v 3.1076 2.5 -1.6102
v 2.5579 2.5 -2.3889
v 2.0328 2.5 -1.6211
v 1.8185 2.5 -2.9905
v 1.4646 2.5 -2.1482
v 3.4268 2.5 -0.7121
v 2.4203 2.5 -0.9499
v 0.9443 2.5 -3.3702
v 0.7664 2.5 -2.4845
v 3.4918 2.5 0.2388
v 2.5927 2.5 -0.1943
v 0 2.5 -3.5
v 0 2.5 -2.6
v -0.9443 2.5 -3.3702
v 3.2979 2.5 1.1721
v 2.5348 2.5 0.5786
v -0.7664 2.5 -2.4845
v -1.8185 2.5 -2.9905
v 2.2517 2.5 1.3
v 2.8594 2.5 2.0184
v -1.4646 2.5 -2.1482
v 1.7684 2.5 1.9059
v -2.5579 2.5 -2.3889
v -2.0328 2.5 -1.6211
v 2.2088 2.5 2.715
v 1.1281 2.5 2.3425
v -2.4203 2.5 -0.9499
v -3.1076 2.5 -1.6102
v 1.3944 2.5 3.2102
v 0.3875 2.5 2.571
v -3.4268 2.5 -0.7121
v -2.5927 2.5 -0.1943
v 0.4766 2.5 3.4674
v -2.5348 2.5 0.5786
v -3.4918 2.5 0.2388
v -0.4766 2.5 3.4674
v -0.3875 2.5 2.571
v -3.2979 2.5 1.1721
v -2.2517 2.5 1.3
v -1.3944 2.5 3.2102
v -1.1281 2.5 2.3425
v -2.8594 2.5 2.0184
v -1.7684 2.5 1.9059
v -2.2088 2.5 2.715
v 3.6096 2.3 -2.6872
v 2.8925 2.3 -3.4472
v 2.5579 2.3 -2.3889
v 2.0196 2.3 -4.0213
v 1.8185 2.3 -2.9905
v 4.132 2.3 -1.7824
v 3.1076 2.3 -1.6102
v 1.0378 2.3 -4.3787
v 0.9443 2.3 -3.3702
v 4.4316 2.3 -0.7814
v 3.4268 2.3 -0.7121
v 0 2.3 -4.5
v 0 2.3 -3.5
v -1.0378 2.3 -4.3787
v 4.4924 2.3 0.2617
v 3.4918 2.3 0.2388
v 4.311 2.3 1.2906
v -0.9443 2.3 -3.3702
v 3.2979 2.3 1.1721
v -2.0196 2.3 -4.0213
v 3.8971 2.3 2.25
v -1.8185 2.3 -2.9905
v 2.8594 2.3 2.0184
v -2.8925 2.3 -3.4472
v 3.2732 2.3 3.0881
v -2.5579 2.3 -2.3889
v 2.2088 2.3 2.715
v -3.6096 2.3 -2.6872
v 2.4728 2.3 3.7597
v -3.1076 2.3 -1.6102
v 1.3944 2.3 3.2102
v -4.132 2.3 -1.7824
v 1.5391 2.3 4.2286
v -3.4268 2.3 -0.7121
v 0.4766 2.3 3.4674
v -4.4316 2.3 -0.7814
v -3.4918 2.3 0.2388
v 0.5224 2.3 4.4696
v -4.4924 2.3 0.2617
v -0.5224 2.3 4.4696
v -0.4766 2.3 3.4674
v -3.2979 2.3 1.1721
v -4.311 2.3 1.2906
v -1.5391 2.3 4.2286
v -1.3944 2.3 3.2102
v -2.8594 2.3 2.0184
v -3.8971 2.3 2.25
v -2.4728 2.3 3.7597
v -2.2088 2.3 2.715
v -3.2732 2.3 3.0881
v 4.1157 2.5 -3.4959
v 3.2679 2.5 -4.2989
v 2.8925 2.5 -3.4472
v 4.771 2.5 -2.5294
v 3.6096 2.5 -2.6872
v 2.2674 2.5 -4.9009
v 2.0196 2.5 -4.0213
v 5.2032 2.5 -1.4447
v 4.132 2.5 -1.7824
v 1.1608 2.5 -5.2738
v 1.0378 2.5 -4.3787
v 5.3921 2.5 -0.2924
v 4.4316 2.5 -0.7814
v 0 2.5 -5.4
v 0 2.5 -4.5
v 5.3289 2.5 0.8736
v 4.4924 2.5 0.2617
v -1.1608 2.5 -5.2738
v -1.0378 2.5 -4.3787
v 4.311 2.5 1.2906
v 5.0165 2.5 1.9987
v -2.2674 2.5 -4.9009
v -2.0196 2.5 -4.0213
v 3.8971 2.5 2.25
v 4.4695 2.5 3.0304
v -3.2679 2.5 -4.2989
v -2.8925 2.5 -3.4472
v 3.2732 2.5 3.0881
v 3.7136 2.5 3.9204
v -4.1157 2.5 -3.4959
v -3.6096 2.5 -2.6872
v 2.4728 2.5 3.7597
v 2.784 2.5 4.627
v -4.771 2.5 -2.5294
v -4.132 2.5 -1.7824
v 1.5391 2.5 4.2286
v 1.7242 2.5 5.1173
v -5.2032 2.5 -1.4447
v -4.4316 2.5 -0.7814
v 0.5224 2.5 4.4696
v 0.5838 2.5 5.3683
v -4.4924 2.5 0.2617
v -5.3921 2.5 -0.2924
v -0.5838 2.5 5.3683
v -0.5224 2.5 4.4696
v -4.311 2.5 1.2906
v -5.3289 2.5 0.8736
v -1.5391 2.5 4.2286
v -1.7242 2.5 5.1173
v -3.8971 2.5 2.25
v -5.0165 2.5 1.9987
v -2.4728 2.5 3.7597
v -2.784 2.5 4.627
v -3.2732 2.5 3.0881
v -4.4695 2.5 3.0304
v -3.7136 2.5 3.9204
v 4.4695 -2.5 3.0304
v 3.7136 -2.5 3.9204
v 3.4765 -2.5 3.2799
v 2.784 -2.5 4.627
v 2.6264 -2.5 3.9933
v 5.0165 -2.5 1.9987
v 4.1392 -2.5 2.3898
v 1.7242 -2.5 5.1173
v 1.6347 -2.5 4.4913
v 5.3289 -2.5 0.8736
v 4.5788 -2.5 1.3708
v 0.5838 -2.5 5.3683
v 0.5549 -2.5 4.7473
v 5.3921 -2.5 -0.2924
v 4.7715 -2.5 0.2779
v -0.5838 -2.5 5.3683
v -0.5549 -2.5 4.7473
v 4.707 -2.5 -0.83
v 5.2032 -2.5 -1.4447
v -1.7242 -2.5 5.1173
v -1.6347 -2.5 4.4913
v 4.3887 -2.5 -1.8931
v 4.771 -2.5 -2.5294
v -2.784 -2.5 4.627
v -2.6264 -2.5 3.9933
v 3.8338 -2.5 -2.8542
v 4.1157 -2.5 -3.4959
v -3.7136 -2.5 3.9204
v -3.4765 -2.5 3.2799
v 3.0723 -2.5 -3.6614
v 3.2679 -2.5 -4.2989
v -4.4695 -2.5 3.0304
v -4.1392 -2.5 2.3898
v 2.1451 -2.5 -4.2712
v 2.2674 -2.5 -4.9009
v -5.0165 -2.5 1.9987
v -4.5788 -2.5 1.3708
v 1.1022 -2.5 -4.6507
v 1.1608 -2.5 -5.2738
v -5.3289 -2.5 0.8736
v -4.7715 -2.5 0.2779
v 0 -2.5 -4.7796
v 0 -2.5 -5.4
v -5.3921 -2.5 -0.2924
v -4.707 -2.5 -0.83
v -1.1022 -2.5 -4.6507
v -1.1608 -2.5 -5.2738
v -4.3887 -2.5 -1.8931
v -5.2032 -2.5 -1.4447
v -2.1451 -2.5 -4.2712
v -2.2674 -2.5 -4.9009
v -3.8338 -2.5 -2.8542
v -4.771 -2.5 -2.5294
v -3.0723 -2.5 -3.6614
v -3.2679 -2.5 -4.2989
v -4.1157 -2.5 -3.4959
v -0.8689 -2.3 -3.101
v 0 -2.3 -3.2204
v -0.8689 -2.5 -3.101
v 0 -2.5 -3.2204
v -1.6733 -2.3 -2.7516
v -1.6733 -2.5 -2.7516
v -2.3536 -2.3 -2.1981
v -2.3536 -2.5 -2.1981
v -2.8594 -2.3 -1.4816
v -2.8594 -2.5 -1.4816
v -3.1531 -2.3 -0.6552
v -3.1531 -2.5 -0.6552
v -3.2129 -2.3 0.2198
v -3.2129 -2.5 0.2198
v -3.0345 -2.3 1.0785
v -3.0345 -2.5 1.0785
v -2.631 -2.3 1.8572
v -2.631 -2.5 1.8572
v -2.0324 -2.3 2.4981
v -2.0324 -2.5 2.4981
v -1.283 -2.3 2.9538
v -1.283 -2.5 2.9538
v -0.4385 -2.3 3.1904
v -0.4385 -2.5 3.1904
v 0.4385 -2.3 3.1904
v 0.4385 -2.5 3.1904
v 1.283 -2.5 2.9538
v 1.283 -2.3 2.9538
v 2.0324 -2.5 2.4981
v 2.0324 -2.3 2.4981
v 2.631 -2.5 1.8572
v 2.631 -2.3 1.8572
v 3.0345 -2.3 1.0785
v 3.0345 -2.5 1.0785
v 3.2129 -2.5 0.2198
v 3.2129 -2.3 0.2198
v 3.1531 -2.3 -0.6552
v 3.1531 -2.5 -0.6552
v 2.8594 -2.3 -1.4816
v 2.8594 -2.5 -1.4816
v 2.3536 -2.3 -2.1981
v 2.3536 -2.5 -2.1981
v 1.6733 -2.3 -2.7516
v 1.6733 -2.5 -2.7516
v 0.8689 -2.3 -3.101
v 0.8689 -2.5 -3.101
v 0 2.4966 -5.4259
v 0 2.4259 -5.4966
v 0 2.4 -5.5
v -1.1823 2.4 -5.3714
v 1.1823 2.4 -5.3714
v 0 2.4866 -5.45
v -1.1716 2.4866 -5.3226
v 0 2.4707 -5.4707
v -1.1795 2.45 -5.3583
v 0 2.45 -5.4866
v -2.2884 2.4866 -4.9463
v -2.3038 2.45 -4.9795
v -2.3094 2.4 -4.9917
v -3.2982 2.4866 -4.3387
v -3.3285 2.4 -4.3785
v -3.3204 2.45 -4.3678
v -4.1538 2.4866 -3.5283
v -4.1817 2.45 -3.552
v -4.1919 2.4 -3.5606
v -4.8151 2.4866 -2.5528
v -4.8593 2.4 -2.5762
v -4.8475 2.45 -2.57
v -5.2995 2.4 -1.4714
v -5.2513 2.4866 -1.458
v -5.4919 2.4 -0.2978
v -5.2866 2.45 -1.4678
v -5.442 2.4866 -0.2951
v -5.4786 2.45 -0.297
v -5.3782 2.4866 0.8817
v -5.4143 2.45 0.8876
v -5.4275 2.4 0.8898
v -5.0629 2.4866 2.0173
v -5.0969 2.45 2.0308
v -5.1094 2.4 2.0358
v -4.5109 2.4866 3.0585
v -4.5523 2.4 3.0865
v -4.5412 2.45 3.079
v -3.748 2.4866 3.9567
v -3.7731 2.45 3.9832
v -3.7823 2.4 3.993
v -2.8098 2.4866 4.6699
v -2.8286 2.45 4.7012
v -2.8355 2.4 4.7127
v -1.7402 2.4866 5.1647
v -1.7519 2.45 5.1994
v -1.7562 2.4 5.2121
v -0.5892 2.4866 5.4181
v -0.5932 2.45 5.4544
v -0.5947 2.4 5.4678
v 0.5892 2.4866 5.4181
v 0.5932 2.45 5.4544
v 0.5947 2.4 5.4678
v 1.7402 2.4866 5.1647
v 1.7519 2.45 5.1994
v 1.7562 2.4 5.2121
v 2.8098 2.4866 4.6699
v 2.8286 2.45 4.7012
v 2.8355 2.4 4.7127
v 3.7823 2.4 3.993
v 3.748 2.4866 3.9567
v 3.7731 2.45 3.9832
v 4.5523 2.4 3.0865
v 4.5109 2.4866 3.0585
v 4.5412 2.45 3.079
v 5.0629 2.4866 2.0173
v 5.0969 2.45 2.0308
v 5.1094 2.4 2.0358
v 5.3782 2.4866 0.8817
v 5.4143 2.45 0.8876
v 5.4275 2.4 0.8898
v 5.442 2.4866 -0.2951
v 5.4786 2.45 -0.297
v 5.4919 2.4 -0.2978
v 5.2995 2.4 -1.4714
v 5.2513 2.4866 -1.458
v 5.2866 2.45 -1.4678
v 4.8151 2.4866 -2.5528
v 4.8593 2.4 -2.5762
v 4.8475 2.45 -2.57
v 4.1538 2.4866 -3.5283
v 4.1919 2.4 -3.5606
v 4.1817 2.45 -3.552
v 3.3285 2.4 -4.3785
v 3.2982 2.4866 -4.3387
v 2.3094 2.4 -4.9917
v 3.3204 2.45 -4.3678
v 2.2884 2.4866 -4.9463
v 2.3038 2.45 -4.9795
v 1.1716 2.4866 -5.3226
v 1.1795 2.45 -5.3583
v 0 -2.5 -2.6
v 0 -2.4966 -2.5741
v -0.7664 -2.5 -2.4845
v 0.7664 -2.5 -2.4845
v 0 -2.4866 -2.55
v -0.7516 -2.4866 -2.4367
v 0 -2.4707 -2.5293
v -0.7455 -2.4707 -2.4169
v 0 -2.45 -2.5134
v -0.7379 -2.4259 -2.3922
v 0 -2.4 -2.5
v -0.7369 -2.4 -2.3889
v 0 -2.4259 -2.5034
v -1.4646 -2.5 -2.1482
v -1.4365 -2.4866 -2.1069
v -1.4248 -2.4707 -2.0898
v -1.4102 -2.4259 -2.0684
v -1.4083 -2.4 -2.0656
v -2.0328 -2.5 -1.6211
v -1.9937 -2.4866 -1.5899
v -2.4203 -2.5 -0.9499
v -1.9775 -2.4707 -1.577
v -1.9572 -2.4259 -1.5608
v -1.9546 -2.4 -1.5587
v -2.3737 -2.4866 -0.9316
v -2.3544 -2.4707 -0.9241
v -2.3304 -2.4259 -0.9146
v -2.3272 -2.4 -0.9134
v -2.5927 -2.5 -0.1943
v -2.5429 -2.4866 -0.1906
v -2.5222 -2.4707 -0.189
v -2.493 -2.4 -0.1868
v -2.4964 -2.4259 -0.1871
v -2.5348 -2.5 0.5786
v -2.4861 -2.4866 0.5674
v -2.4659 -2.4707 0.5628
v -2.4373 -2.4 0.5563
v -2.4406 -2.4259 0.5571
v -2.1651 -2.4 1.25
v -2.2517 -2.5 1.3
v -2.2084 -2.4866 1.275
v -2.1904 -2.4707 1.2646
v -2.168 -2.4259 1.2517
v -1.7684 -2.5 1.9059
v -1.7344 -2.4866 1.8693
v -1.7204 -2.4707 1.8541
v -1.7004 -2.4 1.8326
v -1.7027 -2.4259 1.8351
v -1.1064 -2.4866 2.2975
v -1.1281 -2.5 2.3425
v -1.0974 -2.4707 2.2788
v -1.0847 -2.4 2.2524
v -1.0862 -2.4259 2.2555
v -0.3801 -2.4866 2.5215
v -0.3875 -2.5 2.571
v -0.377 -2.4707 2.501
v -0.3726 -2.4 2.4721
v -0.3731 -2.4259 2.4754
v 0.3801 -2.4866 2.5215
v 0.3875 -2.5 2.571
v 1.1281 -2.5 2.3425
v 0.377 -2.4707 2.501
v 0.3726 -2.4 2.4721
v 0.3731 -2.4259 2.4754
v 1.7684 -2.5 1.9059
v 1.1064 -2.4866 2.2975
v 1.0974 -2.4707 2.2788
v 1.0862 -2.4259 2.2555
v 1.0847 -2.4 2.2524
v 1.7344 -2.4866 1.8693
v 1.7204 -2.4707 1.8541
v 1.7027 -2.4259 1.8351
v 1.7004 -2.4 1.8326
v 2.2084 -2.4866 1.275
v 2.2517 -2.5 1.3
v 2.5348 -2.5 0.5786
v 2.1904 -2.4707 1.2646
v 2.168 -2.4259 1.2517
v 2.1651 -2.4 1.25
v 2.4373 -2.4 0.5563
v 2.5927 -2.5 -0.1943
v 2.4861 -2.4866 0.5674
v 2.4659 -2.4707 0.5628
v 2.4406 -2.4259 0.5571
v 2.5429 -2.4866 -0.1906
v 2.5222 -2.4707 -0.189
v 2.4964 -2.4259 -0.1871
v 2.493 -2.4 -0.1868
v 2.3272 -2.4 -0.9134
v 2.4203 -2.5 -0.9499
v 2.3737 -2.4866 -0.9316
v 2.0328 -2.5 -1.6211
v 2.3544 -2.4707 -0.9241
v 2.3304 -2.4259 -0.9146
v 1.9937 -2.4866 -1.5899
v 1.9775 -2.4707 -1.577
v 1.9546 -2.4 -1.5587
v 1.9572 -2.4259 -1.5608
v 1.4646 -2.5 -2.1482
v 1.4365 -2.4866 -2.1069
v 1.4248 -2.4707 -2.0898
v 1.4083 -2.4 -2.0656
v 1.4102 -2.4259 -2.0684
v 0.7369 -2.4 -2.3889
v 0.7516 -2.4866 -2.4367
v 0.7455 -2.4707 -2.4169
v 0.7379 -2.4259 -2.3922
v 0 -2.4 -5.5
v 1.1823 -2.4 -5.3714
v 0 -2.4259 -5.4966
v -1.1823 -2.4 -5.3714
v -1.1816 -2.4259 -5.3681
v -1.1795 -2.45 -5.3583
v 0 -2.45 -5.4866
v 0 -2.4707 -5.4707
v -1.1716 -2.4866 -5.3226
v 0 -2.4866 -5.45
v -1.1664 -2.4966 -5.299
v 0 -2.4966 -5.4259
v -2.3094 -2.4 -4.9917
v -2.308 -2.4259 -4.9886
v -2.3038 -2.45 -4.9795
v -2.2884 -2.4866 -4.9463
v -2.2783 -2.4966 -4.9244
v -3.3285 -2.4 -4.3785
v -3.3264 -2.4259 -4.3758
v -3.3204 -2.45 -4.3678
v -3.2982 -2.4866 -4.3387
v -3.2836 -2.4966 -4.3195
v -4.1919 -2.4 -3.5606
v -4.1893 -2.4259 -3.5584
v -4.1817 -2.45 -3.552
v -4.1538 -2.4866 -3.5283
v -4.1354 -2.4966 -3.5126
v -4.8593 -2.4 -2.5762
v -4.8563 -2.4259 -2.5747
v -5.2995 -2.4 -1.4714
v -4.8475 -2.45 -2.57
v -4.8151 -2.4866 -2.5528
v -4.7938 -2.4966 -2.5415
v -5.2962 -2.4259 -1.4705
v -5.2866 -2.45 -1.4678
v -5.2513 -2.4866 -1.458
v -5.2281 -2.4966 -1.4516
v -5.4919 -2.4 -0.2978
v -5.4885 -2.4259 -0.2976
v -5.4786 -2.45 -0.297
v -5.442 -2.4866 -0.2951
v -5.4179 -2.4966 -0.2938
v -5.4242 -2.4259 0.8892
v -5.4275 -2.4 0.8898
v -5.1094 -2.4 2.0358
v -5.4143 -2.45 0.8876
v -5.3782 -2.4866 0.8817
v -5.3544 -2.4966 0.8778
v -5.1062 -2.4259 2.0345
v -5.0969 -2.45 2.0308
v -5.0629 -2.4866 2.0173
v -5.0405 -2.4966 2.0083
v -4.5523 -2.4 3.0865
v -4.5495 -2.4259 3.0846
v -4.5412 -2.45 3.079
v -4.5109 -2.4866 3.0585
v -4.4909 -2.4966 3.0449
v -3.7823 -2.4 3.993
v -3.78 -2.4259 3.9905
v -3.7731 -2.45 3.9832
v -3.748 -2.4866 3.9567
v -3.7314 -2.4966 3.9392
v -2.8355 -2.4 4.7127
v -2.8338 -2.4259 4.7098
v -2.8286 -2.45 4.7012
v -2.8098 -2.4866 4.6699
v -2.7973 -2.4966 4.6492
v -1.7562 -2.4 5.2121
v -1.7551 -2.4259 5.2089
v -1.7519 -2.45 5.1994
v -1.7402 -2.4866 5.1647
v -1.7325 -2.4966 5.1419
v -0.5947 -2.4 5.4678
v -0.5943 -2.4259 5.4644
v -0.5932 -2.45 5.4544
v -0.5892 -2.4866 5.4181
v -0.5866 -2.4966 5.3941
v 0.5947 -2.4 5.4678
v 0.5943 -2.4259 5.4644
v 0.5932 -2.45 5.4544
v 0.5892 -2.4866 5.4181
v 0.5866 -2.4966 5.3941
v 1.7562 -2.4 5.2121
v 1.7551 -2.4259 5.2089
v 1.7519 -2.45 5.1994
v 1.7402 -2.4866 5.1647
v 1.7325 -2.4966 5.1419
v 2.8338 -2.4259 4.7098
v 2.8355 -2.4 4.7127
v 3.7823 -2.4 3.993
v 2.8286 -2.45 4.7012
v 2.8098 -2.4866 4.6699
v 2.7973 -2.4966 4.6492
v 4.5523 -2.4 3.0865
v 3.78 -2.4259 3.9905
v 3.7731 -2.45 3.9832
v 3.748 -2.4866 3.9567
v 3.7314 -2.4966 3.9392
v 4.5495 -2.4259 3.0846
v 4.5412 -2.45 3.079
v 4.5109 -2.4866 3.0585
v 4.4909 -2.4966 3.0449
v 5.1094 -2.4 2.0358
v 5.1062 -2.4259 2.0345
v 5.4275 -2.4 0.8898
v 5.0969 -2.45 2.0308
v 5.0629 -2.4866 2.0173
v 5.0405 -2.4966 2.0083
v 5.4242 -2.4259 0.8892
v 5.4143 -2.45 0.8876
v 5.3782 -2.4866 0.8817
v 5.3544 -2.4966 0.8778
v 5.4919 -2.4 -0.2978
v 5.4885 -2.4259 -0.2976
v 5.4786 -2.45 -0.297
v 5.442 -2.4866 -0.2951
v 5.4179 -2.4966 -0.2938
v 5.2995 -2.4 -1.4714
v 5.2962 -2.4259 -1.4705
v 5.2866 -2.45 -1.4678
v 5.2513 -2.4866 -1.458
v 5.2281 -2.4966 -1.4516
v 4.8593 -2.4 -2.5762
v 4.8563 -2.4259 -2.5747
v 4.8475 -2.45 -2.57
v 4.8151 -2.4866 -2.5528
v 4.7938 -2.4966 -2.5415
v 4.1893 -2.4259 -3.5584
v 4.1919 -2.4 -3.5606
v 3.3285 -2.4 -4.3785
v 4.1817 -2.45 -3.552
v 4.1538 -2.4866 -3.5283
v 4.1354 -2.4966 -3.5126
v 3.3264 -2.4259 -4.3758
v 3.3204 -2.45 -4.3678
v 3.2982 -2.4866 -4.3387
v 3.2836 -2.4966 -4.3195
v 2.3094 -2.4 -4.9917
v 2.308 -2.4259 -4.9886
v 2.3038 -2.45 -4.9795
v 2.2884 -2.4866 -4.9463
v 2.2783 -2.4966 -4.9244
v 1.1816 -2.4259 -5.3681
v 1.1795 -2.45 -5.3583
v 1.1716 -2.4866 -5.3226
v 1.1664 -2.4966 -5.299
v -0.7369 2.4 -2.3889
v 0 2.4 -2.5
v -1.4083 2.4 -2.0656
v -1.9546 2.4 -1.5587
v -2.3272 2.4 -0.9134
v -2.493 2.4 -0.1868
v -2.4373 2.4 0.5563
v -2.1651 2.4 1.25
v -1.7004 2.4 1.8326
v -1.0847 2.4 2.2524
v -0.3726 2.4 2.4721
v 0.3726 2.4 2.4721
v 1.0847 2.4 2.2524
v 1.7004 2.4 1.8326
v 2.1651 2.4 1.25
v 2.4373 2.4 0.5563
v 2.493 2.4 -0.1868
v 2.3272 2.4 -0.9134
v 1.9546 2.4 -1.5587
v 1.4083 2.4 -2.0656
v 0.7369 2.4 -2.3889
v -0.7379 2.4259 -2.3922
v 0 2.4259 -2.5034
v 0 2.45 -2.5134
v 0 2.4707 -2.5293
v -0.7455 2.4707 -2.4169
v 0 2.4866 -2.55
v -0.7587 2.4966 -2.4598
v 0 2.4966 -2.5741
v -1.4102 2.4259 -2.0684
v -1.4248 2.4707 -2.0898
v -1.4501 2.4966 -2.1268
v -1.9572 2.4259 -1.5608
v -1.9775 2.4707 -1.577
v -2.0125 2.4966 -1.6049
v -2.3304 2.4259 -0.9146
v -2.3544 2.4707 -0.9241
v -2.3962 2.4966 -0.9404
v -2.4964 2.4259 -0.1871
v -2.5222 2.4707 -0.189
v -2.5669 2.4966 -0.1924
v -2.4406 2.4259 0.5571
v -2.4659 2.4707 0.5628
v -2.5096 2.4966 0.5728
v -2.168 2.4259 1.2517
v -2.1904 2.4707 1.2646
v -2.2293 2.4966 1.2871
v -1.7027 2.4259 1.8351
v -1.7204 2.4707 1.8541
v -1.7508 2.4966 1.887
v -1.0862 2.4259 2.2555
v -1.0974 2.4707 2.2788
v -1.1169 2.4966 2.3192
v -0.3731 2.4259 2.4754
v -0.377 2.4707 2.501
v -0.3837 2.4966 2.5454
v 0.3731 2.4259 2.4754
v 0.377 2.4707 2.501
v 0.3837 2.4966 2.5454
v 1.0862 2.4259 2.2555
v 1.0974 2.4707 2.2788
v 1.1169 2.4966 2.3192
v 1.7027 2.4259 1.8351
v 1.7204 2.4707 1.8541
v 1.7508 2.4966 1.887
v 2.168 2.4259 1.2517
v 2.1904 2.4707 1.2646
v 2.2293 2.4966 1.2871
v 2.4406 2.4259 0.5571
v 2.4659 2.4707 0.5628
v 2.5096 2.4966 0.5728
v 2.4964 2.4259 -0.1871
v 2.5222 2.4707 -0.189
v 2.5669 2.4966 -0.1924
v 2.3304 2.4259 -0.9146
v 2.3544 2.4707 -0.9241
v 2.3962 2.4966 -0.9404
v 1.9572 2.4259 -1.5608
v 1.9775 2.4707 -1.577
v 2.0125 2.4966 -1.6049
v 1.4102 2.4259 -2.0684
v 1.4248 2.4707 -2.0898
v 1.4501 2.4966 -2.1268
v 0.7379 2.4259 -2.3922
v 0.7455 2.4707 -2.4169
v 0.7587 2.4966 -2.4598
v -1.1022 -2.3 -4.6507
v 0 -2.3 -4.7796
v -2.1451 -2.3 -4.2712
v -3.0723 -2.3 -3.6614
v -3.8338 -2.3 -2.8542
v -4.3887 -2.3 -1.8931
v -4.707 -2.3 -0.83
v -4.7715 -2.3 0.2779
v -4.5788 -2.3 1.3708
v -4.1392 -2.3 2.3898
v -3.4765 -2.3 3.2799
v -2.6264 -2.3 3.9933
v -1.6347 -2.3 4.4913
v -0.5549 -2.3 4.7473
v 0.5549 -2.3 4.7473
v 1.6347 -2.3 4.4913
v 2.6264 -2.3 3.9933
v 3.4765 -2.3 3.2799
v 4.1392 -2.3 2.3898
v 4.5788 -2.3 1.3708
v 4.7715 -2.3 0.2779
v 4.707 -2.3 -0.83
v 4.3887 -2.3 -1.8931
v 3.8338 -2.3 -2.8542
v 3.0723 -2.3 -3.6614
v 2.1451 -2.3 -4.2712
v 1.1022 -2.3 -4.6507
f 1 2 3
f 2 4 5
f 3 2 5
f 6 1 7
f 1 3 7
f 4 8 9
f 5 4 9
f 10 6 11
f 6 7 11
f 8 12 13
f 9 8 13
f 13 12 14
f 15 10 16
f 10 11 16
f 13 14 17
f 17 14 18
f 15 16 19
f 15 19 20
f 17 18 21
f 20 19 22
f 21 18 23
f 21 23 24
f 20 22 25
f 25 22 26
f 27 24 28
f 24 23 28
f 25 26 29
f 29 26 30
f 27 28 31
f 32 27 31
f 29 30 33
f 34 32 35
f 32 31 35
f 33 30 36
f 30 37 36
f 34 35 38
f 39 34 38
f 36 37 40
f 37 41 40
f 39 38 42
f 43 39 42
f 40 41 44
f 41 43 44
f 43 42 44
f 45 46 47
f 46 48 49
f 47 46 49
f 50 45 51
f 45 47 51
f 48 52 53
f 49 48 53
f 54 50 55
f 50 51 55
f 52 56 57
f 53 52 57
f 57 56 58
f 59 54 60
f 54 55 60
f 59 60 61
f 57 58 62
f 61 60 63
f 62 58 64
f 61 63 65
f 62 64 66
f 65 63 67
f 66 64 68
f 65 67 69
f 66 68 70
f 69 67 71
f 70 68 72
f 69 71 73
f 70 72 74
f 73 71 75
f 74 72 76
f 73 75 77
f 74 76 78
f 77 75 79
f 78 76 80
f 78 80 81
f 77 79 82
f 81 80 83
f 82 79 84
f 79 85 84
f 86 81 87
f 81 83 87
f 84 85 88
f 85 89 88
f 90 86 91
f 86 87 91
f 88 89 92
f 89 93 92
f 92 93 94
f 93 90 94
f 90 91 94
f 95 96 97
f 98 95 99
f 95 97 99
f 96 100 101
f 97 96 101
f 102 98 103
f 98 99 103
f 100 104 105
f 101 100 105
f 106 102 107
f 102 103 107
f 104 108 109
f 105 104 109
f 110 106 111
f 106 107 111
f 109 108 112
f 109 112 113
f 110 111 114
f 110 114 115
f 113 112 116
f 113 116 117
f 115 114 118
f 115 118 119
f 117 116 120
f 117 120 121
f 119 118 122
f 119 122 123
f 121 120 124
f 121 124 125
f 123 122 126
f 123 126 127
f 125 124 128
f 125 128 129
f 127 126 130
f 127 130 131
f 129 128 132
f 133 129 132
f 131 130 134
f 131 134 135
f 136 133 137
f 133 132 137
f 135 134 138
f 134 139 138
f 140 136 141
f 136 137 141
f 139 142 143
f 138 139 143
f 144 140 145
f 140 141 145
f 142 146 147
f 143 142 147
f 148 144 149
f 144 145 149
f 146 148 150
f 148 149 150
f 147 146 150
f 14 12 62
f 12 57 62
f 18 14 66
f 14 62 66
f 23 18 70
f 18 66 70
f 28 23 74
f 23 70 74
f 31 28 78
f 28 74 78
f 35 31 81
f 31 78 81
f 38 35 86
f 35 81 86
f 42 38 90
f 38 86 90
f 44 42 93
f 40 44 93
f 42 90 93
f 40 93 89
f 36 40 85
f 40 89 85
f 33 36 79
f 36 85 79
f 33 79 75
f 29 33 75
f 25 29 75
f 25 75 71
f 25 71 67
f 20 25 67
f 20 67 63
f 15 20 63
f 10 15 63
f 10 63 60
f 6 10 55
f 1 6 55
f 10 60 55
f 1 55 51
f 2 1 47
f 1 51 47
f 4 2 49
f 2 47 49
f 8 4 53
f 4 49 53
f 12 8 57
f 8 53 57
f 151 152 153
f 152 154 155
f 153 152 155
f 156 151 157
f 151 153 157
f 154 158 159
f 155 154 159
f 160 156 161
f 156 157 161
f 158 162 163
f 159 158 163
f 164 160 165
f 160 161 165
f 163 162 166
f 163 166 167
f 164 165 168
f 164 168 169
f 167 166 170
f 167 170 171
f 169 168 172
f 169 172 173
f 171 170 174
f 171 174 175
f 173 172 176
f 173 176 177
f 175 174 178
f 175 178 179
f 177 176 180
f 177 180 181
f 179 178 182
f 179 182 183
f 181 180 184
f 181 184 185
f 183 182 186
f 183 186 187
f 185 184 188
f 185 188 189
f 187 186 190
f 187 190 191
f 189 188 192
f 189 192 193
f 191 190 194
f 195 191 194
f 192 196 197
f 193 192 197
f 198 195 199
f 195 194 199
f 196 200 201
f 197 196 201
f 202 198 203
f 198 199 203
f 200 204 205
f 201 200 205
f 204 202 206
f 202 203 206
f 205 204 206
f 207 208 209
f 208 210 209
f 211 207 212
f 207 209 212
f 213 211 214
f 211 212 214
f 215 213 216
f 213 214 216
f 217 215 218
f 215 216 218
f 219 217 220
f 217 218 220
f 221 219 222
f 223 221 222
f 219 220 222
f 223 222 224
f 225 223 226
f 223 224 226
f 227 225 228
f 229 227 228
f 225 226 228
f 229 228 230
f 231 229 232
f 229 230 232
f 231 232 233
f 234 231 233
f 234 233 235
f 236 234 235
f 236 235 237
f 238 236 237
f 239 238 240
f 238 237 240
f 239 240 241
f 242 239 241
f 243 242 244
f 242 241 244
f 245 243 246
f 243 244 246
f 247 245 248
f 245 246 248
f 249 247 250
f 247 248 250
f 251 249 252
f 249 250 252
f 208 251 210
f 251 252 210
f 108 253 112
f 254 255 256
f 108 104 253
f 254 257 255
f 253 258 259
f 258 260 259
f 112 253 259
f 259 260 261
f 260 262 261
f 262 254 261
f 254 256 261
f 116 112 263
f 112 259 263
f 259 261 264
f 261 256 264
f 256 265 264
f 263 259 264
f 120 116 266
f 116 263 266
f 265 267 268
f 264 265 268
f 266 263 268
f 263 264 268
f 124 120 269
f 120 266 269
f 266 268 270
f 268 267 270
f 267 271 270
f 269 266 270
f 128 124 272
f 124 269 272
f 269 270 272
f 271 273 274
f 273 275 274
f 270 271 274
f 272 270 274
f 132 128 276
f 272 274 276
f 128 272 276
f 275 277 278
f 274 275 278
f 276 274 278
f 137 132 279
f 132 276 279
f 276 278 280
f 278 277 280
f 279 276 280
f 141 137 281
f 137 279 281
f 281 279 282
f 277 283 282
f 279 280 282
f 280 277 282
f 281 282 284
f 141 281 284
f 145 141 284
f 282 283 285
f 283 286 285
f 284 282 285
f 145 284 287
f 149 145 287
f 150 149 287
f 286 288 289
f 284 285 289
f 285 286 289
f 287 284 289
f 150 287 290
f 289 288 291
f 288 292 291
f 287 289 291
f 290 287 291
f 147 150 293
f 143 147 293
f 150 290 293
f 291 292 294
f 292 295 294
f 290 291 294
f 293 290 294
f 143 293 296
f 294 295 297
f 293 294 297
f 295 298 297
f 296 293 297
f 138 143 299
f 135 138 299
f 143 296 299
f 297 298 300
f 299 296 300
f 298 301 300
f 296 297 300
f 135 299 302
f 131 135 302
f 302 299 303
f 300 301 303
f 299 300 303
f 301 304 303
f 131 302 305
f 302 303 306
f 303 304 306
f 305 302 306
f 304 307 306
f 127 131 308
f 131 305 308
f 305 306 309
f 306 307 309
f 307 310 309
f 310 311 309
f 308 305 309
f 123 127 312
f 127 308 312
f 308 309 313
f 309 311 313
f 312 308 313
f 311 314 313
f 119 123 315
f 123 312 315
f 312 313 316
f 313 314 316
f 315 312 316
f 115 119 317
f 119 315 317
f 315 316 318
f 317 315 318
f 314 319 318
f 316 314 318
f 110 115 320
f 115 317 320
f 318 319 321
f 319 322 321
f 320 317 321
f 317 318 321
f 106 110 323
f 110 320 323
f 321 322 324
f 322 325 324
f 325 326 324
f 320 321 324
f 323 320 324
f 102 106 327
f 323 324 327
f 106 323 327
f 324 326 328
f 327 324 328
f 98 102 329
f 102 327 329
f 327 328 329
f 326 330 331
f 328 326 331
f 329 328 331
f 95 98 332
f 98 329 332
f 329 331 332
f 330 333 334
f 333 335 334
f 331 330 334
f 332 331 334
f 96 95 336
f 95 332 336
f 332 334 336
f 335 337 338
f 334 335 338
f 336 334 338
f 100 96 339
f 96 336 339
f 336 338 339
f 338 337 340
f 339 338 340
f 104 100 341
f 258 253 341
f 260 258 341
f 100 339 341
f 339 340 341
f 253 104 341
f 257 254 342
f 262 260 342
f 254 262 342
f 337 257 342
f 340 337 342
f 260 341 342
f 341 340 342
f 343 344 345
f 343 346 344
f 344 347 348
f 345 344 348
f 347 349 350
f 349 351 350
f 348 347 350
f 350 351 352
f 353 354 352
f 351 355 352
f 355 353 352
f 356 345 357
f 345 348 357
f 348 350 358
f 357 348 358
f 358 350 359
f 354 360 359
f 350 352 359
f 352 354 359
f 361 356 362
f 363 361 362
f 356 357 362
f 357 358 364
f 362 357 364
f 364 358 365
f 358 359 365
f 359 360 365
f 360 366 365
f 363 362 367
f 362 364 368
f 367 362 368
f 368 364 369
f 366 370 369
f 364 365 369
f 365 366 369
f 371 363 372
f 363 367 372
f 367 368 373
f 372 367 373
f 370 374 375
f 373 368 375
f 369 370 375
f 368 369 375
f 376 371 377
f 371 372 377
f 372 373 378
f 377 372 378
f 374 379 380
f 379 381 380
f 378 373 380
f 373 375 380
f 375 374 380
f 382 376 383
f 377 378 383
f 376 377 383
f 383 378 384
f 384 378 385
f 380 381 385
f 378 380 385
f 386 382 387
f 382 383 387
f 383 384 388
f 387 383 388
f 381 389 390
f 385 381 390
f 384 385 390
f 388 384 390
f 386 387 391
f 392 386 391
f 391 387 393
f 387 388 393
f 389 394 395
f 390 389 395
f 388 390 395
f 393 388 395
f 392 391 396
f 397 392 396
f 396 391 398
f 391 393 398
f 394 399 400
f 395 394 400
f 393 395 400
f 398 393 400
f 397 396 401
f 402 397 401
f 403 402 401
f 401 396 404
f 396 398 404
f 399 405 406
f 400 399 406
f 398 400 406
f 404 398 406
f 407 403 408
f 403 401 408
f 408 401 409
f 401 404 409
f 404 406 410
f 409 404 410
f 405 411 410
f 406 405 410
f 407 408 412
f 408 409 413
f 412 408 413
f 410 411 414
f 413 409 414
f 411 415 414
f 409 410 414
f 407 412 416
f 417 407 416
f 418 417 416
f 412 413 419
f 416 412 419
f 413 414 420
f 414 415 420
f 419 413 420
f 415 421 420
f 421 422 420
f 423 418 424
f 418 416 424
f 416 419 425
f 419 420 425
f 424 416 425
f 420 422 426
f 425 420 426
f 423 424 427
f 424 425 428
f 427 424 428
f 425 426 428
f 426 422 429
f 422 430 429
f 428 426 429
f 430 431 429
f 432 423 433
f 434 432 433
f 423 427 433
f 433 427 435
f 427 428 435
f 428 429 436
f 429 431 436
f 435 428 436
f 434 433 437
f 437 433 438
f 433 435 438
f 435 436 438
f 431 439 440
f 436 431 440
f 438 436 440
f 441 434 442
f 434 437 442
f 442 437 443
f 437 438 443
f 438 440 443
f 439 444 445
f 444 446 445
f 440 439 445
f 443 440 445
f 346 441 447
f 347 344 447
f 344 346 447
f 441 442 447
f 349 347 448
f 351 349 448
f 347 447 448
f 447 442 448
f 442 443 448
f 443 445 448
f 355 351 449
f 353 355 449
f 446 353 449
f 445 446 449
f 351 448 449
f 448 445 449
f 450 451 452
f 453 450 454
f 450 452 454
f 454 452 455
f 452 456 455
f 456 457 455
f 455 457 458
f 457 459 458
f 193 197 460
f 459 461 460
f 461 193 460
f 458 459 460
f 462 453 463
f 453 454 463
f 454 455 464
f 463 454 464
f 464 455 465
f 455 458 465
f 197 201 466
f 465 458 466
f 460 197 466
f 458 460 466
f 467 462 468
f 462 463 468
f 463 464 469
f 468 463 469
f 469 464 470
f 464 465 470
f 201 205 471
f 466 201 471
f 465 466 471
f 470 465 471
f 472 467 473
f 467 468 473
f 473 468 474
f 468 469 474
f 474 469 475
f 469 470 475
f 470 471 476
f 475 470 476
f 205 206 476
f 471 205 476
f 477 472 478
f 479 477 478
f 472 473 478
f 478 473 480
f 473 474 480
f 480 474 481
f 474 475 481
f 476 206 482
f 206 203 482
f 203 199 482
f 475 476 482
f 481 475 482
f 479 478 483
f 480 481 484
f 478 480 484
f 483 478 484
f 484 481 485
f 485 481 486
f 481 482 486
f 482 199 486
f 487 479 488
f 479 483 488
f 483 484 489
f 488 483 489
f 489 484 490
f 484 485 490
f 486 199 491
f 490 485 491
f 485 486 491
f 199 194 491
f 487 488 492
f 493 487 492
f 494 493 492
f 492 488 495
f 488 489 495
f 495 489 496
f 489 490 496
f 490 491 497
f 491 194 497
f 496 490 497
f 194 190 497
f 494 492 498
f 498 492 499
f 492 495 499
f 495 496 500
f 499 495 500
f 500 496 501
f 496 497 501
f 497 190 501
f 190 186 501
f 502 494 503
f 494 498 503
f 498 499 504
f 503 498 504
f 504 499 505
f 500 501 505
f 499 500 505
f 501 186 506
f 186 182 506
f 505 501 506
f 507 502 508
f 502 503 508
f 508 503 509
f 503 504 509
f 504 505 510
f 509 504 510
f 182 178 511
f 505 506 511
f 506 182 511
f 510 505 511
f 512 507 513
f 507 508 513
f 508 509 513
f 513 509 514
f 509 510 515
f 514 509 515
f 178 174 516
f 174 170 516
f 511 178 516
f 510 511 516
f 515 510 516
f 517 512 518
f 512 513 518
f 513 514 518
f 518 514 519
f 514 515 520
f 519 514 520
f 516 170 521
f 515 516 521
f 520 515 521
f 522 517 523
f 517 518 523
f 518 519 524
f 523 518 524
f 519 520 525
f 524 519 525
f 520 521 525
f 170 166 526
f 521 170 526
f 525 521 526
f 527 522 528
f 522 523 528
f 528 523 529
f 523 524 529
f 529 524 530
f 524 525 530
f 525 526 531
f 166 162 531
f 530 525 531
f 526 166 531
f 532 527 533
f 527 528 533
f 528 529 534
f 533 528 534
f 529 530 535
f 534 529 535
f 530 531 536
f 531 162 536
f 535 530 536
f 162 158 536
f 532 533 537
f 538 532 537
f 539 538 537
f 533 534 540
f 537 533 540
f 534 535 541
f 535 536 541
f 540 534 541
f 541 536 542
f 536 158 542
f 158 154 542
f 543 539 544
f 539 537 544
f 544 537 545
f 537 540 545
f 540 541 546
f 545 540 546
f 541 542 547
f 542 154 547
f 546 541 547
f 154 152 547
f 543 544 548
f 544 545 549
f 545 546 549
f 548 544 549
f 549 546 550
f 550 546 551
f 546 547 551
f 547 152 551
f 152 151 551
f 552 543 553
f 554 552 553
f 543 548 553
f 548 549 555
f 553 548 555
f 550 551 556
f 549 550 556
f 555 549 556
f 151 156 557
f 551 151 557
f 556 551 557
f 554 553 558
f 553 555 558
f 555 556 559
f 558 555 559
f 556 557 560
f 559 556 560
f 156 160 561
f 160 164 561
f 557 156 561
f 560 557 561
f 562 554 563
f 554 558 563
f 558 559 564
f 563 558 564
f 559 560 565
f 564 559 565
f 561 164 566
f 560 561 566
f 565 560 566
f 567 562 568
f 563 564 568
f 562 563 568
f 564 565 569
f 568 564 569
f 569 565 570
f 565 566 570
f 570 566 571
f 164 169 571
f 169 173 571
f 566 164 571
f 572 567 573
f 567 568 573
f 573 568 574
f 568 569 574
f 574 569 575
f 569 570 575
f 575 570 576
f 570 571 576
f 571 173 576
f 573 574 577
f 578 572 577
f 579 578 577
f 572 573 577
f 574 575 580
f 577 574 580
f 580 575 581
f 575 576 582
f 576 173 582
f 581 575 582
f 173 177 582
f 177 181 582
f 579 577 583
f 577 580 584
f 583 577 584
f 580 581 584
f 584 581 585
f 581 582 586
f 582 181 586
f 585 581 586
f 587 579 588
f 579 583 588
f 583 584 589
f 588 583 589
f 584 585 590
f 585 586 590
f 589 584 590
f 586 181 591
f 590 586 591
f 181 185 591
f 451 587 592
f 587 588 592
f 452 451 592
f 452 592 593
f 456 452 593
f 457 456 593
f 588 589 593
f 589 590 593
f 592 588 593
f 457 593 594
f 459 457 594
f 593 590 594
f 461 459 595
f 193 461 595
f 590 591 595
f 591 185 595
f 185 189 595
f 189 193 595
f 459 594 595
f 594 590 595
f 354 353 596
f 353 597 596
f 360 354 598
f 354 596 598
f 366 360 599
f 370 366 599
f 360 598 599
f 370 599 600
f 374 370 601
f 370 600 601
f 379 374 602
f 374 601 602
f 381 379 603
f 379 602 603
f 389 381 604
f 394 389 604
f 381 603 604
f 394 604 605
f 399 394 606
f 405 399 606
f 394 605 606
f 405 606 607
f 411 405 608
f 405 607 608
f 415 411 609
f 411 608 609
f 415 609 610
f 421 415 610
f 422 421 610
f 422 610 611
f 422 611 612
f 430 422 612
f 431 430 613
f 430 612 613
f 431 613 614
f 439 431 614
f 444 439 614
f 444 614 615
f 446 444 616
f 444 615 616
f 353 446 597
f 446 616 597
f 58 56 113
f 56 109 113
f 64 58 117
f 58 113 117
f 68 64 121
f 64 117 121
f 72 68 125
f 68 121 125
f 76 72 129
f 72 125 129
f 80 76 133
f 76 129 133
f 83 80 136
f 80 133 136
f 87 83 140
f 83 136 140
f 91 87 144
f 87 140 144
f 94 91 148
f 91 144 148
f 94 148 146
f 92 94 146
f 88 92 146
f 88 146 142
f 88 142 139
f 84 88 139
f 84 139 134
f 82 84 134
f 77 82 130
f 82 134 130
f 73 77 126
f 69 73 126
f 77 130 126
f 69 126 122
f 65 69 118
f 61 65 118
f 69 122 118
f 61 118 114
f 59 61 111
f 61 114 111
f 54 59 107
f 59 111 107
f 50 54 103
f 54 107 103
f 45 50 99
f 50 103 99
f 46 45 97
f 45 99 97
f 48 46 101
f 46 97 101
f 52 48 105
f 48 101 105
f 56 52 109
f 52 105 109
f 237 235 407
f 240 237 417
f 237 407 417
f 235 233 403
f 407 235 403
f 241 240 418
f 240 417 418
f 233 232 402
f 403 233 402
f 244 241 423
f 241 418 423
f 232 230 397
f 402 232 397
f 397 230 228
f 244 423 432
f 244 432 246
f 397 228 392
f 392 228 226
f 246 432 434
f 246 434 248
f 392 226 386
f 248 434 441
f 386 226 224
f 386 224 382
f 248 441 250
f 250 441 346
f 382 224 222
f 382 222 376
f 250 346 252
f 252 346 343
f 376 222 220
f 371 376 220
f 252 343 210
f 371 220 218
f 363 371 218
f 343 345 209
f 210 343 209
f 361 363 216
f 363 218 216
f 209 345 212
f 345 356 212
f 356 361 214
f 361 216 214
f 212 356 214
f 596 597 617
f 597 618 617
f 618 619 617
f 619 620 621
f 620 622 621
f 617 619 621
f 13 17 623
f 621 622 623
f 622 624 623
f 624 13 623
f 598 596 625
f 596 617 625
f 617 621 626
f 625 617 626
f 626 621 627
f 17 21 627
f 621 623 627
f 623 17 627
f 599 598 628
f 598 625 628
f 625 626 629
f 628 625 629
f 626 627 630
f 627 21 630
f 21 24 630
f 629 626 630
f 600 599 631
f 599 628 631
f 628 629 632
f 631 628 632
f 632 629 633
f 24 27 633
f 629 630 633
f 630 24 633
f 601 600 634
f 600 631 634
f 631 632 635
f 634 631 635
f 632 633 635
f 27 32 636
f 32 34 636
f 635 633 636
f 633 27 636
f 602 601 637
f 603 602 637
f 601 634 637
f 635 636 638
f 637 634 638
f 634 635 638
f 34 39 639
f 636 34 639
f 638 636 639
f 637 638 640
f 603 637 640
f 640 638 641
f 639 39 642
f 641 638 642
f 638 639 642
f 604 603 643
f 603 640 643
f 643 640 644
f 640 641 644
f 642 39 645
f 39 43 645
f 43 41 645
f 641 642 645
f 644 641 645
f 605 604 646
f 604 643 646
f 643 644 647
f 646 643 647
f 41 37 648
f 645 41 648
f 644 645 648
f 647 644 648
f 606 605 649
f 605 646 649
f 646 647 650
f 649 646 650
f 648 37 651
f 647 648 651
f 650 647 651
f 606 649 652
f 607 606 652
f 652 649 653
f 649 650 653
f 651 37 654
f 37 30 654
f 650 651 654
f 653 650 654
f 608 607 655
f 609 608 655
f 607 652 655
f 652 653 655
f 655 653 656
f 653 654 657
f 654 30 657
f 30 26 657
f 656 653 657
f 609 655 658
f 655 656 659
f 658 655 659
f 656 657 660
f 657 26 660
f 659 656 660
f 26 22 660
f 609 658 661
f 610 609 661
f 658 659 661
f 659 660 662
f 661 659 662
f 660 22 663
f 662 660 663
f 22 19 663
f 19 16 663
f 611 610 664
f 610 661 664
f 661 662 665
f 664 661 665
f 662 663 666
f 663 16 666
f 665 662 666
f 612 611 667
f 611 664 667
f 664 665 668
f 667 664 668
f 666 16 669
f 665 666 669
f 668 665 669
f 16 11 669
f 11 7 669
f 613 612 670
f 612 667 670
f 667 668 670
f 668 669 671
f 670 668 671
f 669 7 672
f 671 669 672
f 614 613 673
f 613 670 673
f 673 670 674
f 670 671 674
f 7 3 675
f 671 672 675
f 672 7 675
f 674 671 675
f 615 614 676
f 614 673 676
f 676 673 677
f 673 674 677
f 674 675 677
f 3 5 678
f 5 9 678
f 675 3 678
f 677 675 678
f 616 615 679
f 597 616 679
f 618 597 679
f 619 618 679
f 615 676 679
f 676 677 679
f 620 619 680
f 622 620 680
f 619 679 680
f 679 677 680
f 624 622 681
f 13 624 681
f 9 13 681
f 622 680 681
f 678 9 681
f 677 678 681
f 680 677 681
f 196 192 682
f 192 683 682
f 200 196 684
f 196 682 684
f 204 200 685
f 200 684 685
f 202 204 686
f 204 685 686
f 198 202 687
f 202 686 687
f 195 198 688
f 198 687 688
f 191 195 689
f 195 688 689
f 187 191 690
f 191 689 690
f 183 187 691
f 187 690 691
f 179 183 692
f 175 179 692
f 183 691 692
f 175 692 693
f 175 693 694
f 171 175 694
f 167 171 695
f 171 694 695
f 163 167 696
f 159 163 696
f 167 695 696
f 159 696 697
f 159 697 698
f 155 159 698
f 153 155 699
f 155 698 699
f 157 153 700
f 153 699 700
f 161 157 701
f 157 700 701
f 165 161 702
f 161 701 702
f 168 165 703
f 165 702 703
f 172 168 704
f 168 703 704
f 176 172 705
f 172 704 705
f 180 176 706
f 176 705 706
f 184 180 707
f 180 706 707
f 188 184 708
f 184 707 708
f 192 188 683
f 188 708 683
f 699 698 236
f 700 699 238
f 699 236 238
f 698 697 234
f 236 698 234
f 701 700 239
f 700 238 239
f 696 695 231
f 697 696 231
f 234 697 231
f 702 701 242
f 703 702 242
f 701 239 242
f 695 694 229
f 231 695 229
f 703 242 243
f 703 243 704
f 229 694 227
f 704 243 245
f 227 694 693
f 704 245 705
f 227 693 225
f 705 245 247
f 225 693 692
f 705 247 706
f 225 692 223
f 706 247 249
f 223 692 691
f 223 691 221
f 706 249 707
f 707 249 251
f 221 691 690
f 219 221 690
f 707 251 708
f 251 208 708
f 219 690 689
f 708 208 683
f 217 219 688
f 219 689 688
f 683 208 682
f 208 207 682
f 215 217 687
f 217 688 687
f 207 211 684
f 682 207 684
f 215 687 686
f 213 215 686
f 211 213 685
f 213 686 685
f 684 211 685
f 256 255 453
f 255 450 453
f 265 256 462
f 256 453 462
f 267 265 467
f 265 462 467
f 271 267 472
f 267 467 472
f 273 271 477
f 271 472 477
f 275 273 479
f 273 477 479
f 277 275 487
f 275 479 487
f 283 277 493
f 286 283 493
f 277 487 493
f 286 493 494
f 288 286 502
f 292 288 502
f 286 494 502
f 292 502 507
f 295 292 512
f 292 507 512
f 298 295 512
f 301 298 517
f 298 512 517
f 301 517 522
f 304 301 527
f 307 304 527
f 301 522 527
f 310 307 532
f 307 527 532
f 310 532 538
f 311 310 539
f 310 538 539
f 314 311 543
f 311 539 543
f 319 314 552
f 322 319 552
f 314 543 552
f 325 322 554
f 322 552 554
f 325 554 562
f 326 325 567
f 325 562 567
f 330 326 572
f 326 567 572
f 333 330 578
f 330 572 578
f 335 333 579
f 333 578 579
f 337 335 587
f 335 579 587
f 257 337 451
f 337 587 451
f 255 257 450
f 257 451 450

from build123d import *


with BuildPart() as part:
    # Croquis1 → Revolución1 (revolve)
    with BuildSketch(Plane(origin=(0, 0, 0), x_dir=(0, 0, -1), z_dir=(1, 0, 0))):
        with BuildLine():
            Line((2.5, -2.4), (2.5, 2.4))
            ThreePointArc((2.5, 2.4), (2.529289322, 2.470710678), (2.6, 2.5))
            Line((2.6, 2.5), (3.5, 2.5))
            Line((3.5, 2.5), (3.5, 2.3))
            Line((3.5, 2.3), (4.5, 2.3))
            Line((4.5, 2.3), (4.5, 2.5))
            Line((4.5, 2.5), (5.4, 2.5))
            ThreePointArc((5.4, 2.5), (5.470710678, 2.470710678), (5.5, 2.4))
            Line((5.5, 2.4), (5.5, -2.4))
            ThreePointArc((5.5, -2.4), (5.470710678, -2.470710678), (5.4, -2.5))
            Line((5.4, -2.5), (4.779574592, -2.5))
            Line((4.779574592, -2.5), (4.779574592, -2.3))
            Line((4.779574592, -2.3), (3.220425408, -2.3))
            Line((3.220425408, -2.3), (3.220425408, -2.5))
            Line((3.220425408, -2.5), (2.6, -2.5))
            ThreePointArc((2.6, -2.5), (2.529289322, -2.470710678), (2.5, -2.4))
        make_face()
    revolve(axis=Axis((0, -2.255244755, 0), (0, 1, 0)))


solid = part.part
